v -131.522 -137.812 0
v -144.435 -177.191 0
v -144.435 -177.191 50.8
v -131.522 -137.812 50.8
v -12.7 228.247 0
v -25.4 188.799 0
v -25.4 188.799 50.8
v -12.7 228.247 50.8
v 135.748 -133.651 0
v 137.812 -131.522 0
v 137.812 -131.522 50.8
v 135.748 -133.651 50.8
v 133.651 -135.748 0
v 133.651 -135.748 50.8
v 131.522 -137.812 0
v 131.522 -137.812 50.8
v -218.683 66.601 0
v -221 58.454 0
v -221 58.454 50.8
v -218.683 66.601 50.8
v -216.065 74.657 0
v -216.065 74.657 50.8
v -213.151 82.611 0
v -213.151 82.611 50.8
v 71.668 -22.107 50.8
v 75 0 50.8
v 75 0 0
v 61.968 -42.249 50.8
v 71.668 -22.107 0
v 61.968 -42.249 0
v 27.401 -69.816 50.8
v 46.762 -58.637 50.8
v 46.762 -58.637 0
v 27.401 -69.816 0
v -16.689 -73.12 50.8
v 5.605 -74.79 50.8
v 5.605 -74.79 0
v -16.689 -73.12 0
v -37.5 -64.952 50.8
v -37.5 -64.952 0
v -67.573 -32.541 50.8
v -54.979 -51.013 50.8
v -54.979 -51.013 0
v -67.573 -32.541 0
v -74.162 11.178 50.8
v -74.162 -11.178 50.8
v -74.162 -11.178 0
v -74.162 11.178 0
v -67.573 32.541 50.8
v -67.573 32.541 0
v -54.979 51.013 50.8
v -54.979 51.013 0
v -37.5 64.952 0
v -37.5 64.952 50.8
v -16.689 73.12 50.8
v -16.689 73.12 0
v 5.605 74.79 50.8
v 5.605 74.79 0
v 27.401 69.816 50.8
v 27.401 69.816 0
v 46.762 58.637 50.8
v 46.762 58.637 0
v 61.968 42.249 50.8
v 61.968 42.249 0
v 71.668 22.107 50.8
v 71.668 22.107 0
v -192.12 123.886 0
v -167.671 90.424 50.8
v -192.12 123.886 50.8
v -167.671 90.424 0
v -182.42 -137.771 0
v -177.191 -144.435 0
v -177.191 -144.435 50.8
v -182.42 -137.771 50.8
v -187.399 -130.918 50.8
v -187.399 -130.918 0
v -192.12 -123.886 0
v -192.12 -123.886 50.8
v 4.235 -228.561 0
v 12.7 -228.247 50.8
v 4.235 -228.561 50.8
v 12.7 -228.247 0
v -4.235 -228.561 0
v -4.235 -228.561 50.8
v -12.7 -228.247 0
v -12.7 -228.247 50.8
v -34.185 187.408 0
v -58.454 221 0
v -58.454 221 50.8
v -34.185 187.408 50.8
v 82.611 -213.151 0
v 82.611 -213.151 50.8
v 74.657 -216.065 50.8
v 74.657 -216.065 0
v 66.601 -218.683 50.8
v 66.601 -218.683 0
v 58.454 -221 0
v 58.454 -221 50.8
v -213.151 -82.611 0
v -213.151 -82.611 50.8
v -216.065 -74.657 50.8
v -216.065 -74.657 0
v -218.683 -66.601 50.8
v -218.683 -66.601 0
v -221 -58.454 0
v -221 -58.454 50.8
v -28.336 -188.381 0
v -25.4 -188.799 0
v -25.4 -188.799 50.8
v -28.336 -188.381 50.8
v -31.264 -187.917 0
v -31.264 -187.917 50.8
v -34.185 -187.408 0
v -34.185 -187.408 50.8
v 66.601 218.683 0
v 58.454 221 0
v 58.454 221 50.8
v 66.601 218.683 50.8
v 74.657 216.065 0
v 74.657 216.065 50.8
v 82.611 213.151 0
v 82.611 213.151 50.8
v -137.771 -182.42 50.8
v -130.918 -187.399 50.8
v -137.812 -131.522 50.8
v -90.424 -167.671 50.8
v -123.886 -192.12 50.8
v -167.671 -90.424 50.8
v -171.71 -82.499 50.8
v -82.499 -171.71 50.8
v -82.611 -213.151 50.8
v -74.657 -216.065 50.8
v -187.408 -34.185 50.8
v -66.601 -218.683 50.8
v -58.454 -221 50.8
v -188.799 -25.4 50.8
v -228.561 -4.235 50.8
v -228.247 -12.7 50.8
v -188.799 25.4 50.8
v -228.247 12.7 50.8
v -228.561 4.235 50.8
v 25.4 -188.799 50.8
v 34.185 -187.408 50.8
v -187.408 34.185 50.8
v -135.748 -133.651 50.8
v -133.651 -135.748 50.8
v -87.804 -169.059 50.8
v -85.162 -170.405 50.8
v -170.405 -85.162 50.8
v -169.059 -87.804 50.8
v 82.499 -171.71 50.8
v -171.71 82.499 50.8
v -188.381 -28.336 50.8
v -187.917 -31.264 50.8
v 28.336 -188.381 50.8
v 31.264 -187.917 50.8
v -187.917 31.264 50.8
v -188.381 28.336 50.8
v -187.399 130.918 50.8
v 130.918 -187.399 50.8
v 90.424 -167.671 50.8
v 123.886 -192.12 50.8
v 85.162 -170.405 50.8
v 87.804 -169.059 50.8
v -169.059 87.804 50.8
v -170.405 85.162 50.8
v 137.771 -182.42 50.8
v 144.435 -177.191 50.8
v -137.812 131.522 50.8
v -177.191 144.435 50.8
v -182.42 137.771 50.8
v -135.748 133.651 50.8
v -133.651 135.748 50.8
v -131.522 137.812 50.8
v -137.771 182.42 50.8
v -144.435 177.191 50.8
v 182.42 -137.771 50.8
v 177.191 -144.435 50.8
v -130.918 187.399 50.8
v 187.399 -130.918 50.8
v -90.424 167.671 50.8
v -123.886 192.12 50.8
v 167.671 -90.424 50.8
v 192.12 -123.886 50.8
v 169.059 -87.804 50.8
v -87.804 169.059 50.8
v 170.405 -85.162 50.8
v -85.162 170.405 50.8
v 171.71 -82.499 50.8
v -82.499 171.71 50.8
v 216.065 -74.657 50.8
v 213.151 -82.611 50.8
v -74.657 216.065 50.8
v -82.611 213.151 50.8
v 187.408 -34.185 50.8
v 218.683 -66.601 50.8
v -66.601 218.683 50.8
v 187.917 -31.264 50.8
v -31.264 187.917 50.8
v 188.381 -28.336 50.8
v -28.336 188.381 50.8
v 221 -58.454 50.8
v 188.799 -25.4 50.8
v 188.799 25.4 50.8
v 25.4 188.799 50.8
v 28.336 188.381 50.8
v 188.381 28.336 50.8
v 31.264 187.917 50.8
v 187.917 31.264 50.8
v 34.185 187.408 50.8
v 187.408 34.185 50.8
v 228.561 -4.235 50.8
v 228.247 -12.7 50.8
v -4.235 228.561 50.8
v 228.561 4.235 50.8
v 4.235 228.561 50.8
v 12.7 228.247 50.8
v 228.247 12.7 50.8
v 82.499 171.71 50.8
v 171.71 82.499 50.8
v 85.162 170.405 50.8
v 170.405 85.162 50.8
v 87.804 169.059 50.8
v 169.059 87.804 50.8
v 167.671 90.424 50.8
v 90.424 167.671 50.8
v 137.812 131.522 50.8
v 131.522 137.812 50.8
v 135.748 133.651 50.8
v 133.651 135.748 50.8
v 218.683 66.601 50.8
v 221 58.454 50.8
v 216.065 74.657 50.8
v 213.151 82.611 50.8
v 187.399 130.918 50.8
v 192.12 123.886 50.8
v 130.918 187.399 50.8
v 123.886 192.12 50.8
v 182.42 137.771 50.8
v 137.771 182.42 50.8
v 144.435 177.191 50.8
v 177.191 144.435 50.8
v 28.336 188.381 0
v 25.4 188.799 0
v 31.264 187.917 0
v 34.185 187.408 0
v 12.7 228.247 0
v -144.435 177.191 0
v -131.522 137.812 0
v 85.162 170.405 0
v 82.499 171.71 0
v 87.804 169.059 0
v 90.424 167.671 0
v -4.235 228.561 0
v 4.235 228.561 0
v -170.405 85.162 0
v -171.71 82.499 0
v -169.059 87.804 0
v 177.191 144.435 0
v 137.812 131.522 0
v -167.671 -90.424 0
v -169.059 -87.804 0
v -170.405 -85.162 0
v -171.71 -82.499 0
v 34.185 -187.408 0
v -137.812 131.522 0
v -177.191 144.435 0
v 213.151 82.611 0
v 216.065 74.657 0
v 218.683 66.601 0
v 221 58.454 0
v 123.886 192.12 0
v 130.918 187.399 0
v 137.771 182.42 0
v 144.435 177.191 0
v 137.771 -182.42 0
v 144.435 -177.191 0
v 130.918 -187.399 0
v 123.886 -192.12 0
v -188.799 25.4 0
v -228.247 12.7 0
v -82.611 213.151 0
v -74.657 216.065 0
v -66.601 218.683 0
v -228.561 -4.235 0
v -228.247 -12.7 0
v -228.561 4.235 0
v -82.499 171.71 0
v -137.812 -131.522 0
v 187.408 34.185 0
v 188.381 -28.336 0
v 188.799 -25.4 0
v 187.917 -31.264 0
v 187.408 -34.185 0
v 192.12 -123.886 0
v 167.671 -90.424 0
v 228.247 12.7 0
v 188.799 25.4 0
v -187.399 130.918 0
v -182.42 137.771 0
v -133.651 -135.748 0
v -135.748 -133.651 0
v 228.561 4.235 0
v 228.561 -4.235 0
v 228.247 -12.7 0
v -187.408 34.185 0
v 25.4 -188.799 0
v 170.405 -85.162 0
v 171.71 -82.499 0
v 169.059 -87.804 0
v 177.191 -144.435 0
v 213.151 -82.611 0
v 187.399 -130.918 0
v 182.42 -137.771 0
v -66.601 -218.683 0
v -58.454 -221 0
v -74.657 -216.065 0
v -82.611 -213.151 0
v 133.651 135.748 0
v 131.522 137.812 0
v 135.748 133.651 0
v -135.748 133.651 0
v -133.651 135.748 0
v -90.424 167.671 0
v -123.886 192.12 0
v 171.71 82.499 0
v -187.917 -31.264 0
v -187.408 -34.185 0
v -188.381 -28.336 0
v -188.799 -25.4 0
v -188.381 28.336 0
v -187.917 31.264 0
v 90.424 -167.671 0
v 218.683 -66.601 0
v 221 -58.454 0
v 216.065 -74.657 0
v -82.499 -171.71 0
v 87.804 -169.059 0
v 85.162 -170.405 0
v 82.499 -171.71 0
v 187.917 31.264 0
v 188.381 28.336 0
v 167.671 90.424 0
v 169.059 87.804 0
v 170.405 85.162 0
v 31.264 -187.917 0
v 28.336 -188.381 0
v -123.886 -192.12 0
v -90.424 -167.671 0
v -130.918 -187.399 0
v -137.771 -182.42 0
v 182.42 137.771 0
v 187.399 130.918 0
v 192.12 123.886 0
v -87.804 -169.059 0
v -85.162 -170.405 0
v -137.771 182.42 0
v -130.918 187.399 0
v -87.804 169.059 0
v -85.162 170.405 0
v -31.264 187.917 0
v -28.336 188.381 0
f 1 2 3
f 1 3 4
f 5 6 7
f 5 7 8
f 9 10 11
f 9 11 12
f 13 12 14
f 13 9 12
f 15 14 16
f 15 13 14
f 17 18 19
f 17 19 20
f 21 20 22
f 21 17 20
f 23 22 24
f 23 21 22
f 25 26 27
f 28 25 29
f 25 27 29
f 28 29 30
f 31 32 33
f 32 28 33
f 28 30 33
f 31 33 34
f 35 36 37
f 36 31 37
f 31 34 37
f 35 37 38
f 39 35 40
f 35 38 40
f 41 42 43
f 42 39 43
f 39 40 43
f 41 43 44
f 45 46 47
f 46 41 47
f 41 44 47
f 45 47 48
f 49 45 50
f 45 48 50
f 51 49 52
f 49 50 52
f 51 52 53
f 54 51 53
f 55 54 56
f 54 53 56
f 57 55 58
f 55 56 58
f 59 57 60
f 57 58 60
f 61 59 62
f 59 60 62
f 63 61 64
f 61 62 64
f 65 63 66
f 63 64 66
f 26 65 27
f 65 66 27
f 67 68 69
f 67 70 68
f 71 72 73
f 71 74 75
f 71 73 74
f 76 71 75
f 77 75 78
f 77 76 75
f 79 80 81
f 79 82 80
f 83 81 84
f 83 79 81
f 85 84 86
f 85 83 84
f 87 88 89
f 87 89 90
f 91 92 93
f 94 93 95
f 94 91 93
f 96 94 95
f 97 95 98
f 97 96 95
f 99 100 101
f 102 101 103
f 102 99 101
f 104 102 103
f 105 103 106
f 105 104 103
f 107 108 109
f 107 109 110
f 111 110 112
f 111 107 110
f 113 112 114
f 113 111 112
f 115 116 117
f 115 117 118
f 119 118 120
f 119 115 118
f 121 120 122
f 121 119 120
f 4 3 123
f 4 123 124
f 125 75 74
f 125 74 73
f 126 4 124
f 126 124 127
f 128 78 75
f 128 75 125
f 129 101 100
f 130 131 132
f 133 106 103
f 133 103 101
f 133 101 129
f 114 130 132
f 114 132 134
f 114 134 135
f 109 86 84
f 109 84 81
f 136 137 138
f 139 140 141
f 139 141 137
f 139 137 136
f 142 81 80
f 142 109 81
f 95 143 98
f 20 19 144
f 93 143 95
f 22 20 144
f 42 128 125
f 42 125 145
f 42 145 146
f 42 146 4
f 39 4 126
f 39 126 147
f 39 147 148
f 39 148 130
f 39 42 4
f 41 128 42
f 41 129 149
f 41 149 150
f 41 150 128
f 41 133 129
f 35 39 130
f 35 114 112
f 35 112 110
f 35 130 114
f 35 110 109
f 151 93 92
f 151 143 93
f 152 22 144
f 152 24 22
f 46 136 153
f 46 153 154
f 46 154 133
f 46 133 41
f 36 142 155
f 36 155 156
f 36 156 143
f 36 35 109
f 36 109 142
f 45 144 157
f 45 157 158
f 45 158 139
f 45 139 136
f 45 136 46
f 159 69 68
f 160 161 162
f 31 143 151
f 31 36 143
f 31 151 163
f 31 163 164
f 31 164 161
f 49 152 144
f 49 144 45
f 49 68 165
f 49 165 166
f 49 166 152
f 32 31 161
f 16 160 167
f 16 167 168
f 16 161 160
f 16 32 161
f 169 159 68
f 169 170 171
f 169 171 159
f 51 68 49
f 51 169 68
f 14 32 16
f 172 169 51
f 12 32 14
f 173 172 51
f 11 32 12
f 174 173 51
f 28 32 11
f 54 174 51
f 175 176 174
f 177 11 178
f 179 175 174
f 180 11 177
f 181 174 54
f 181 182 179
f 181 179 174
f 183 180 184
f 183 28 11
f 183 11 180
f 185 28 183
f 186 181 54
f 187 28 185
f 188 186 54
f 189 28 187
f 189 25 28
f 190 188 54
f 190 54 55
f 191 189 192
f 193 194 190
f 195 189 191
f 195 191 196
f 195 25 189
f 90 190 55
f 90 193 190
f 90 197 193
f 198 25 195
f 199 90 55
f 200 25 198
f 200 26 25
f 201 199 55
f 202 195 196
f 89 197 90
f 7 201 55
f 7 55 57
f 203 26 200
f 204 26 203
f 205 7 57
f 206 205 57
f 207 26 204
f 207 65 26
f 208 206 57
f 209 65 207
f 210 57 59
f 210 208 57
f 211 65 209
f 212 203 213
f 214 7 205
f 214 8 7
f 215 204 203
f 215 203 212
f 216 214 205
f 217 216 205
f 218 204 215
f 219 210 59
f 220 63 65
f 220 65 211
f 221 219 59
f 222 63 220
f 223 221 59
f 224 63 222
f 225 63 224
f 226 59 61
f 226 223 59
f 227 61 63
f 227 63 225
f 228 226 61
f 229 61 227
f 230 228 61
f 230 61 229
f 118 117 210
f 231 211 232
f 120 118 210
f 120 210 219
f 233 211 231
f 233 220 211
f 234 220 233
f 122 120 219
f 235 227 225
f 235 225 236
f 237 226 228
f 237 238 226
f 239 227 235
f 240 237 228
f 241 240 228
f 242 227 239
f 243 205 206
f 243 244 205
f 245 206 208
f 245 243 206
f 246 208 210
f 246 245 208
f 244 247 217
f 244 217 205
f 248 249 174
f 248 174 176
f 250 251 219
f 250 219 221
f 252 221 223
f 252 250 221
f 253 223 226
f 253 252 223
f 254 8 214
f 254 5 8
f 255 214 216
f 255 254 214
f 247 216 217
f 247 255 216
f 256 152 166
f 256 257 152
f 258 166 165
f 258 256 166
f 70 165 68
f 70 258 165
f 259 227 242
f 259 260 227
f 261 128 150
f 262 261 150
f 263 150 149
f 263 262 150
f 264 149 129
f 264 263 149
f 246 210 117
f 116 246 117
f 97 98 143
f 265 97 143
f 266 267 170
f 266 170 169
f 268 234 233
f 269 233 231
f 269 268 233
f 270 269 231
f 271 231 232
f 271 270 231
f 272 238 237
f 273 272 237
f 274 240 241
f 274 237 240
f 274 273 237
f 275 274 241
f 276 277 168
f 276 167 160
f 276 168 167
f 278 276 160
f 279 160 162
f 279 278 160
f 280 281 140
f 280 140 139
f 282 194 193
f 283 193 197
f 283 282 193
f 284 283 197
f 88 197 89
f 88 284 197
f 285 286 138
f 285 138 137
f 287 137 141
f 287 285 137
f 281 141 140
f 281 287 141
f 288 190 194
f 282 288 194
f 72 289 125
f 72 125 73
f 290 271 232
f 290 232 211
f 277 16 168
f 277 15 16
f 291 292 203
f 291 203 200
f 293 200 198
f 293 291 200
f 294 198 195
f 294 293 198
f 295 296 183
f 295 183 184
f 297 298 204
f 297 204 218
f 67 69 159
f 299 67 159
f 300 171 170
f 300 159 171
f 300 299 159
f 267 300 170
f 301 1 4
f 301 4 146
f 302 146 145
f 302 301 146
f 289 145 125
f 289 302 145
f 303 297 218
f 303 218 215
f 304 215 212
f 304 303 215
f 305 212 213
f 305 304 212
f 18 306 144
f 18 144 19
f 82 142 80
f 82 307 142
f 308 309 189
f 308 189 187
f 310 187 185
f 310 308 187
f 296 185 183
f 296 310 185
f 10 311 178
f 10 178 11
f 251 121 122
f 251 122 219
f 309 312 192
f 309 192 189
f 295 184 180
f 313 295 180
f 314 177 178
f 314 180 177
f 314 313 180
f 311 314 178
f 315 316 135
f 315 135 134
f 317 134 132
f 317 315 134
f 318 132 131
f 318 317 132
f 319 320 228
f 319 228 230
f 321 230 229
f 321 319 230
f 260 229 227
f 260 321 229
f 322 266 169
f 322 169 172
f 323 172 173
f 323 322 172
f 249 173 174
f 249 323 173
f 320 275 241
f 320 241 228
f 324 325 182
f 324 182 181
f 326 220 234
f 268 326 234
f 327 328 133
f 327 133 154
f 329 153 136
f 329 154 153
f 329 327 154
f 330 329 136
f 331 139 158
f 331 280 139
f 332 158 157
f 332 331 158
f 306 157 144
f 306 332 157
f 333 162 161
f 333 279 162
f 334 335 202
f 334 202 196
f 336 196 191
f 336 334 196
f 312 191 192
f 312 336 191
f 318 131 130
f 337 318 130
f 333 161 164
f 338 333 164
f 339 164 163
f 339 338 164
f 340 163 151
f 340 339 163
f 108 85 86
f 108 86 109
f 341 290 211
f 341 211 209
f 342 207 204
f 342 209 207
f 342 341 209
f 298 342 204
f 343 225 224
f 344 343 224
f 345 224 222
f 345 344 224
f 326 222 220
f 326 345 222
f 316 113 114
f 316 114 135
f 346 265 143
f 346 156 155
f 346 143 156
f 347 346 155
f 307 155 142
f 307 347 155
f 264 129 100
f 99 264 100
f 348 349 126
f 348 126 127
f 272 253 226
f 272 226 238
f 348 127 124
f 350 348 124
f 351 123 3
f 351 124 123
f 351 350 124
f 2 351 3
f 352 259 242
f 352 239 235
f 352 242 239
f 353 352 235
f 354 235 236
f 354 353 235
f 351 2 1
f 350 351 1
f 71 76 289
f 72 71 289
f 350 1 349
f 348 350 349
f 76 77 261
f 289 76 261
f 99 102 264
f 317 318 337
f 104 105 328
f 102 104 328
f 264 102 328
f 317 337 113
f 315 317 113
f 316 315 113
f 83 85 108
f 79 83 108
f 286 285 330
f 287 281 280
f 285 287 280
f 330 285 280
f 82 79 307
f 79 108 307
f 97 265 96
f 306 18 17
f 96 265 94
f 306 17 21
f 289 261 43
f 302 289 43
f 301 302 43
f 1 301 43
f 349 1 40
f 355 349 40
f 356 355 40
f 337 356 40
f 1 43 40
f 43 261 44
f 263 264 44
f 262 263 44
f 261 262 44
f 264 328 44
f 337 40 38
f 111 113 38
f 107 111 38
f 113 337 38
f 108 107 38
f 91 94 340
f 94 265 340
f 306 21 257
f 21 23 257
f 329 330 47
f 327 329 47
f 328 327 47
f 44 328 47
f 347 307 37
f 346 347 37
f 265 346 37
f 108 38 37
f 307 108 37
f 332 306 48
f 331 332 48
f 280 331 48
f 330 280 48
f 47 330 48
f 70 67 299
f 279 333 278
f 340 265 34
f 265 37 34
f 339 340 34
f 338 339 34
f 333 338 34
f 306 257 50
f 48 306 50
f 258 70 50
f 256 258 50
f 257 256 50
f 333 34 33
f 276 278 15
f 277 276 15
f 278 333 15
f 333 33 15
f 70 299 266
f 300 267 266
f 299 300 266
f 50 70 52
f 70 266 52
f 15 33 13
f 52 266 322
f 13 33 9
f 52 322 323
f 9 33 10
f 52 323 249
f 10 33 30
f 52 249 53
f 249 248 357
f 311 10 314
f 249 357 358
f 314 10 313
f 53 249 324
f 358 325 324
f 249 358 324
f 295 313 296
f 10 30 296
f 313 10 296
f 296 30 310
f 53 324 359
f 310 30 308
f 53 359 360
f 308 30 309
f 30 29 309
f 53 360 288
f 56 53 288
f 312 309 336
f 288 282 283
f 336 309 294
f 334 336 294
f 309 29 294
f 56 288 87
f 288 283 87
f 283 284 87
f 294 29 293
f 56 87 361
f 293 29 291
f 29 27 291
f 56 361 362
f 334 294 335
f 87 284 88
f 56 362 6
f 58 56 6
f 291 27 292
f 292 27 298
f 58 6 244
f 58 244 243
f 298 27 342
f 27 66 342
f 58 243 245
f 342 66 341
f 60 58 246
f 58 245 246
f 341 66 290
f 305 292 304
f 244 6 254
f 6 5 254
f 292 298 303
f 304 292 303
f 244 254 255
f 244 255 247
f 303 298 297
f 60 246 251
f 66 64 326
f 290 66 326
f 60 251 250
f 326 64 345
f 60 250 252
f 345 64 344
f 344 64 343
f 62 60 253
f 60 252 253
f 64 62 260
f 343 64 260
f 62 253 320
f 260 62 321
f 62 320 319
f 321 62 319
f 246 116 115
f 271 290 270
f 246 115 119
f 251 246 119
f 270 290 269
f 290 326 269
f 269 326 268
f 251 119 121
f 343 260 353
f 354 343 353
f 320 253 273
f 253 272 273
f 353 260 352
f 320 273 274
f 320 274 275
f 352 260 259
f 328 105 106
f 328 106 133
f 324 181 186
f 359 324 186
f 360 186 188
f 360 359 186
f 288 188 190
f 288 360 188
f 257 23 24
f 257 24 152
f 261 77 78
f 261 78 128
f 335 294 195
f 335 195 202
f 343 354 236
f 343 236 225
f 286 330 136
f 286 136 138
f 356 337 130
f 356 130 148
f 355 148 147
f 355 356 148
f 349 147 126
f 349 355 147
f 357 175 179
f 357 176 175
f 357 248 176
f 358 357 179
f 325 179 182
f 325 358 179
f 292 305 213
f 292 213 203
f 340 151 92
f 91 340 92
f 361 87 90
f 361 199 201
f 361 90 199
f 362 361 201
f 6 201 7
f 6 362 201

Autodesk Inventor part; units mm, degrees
ref_plane "YZ Plane" through (0, 0, 0) normal (1, 0, 0) x (0, 1, 0)
ref_plane "XZ Plane" through (0, 0, 0) normal (0, 1, 0) x (-1, 0, 0)
ref_plane "XY Plane" through (0, 0, 0) normal (0, 0, 1) x (1, 0, 0)
sketch "Sketch1" plane through (0, 0, 0) normal (0, 0, 1) x (1, 0, 0)
  arc A0 (12.7, 228.2469) -> (-12.7, 228.2469) centre (0, 0) ccw
  line L0 (-25.4, 188.7991) -> (-12.7, 228.2469)
  line L1 (12.7, 228.2469) -> (25.4, 188.7991)
  arc A1 (-58.4538, 221.0003) -> (-82.6106, 213.1512) centre (0, 0) ccw
  line L2 (-82.499, 171.7096) -> (-82.6106, 213.1512)
  line L3 (-58.4538, 221.0003) -> (-34.1853, 187.4076)
  arc A2 (-123.8857, 192.1205) -> (-144.4347, 177.1908) centre (0, 0) ccw
  line L4 (-131.5223, 137.8119) -> (-144.4347, 177.1908)
  line L5 (-123.8857, 192.1205) -> (-90.4243, 167.6714)
  arc A3 (-177.1908, 144.4347) -> (-192.1205, 123.8857) centre (0, 0) ccw
  line L6 (-167.6714, 90.4243) -> (-192.1205, 123.8857)
  line L7 (-177.1908, 144.4347) -> (-137.8119, 131.5223)
  arc A4 (-213.1512, 82.6106) -> (-221.0003, 58.4538) centre (0, 0) ccw
  line L8 (-187.4076, 34.1853) -> (-221.0003, 58.4538)
  line L9 (-213.1512, 82.6106) -> (-171.7096, 82.499)
  arc A5 (-228.2469, 12.7) -> (-228.2469, -12.7) centre (0, 0) ccw
  line L10 (-188.7991, -25.4) -> (-228.2469, -12.7)
  line L11 (-228.2469, 12.7) -> (-188.7991, 25.4)
  arc A6 (-221.0003, -58.4538) -> (-213.1512, -82.6106) centre (0, 0) ccw
  line L12 (-171.7096, -82.499) -> (-213.1512, -82.6106)
  line L13 (-221.0003, -58.4538) -> (-187.4076, -34.1853)
  arc A7 (-192.1205, -123.8857) -> (-177.1908, -144.4347) centre (0, 0) ccw
  line L14 (-137.8119, -131.5223) -> (-177.1908, -144.4347)
  line L15 (-192.1205, -123.8857) -> (-167.6714, -90.4243)
  arc A8 (-144.4347, -177.1908) -> (-123.8857, -192.1205) centre (0, 0) ccw
  line L16 (-90.4243, -167.6714) -> (-123.8857, -192.1205)
  line L17 (-144.4347, -177.1908) -> (-131.5223, -137.8119)
  arc A9 (-82.6106, -213.1512) -> (-58.4538, -221.0003) centre (0, 0) ccw
  line L18 (-34.1853, -187.4076) -> (-58.4538, -221.0003)
  line L19 (-82.6106, -213.1512) -> (-82.499, -171.7096)
  arc A10 (-12.7, -228.2469) -> (12.7, -228.2469) centre (0, 0) ccw
  line L20 (25.4, -188.7991) -> (12.7, -228.2469)
  line L21 (-12.7, -228.2469) -> (-25.4, -188.7991)
  arc A11 (58.4538, -221.0003) -> (82.6106, -213.1512) centre (0, 0) ccw
  line L22 (82.499, -171.7096) -> (82.6106, -213.1512)
  line L23 (58.4538, -221.0003) -> (34.1853, -187.4076)
  arc A12 (123.8857, -192.1205) -> (144.4347, -177.1908) centre (0, 0) ccw
  line L24 (131.5223, -137.8119) -> (144.4347, -177.1908)
  line L25 (123.8857, -192.1205) -> (90.4243, -167.6714)
  arc A13 (177.1908, -144.4347) -> (192.1205, -123.8857) centre (0, 0) ccw
  line L26 (167.6714, -90.4243) -> (192.1205, -123.8857)
  line L27 (177.1908, -144.4347) -> (137.8119, -131.5223)
  arc A14 (213.1512, -82.6106) -> (221.0003, -58.4538) centre (0, 0) ccw
  line L28 (187.4076, -34.1853) -> (221.0003, -58.4538)
  line L29 (213.1512, -82.6106) -> (171.7096, -82.499)
  arc A15 (228.2469, -12.7) -> (228.2469, 12.7) centre (0, 0) ccw
  line L30 (188.7991, 25.4) -> (228.2469, 12.7)
  line L31 (228.2469, -12.7) -> (188.7991, -25.4)
  arc A16 (221.0003, 58.4538) -> (213.1512, 82.6106) centre (0, 0) ccw
  line L32 (171.7096, 82.499) -> (213.1512, 82.6106)
  line L33 (221.0003, 58.4538) -> (187.4076, 34.1853)
  arc A17 (192.1205, 123.8857) -> (177.1908, 144.4347) centre (0, 0) ccw
  line L34 (137.8119, 131.5223) -> (177.1908, 144.4347)
  line L35 (192.1205, 123.8857) -> (167.6714, 90.4243)
  arc A18 (144.4347, 177.1908) -> (123.8857, 192.1205) centre (0, 0) ccw
  line L36 (90.4243, 167.6714) -> (123.8857, 192.1205)
  line L37 (144.4347, 177.1908) -> (131.5223, 137.8119)
  arc A19 (82.6106, 213.1512) -> (58.4538, 221.0003) centre (0, 0) ccw
  line L38 (34.1853, 187.4076) -> (58.4538, 221.0003)
  line L39 (82.6106, 213.1512) -> (82.499, 171.7096)
  arc A20 (-131.5223, 137.8119) -> (-137.8119, 131.5223) centre (0, 0) ccw
  arc A21 (-167.6714, 90.4243) -> (-171.7096, 82.499) centre (0, 0) ccw
  arc A22 (-187.4076, 34.1853) -> (-188.7991, 25.4) centre (0, 0) ccw
  arc A23 (-188.7991, -25.4) -> (-187.4076, -34.1853) centre (0, 0) ccw
  arc A24 (-171.7096, -82.499) -> (-167.6714, -90.4243) centre (0, 0) ccw
  arc A25 (-82.499, 171.7096) -> (-90.4243, 167.6714) centre (0, 0) ccw
  arc A26 (-25.4, 188.7991) -> (-34.1853, 187.4076) centre (0, 0) ccw
  arc A27 (34.1853, 187.4076) -> (25.4, 188.7991) centre (0, 0) ccw
  arc A28 (90.4243, 167.6714) -> (82.499, 171.7096) centre (0, 0) ccw
  arc A29 (137.8119, 131.5223) -> (131.5223, 137.8119) centre (0, 0) ccw
  arc A30 (171.7096, 82.499) -> (167.6714, 90.4243) centre (0, 0) ccw
  arc A31 (188.7991, 25.4) -> (187.4076, 34.1853) centre (0, 0) ccw
  arc A32 (187.4076, -34.1853) -> (188.7991, -25.4) centre (0, 0) ccw
  arc A33 (167.6714, -90.4243) -> (171.7096, -82.499) centre (0, 0) ccw
  arc A34 (131.5223, -137.8119) -> (137.8119, -131.5223) centre (0, 0) ccw
  arc A35 (82.499, -171.7096) -> (90.4243, -167.6714) centre (0, 0) ccw
  arc A36 (-137.8119, -131.5223) -> (-131.5223, -137.8119) centre (0, 0) ccw
  arc A37 (-90.4243, -167.6714) -> (-82.499, -171.7096) centre (0, 0) ccw
  arc A38 (-34.1853, -187.4076) -> (-25.4, -188.7991) centre (0, 0) ccw
  arc A39 (25.4, -188.7991) -> (34.1853, -187.4076) centre (0, 0) ccw
  circle A40 centre (0, 0) radius 75
  dimension "d10" = 457.2
  dimension "d18" = 360
  dimension "d20" = 150
extrude "Extrusion1" add sketch "Sketch1" along normal blind 50.8
properties part number "Engrenagem"
